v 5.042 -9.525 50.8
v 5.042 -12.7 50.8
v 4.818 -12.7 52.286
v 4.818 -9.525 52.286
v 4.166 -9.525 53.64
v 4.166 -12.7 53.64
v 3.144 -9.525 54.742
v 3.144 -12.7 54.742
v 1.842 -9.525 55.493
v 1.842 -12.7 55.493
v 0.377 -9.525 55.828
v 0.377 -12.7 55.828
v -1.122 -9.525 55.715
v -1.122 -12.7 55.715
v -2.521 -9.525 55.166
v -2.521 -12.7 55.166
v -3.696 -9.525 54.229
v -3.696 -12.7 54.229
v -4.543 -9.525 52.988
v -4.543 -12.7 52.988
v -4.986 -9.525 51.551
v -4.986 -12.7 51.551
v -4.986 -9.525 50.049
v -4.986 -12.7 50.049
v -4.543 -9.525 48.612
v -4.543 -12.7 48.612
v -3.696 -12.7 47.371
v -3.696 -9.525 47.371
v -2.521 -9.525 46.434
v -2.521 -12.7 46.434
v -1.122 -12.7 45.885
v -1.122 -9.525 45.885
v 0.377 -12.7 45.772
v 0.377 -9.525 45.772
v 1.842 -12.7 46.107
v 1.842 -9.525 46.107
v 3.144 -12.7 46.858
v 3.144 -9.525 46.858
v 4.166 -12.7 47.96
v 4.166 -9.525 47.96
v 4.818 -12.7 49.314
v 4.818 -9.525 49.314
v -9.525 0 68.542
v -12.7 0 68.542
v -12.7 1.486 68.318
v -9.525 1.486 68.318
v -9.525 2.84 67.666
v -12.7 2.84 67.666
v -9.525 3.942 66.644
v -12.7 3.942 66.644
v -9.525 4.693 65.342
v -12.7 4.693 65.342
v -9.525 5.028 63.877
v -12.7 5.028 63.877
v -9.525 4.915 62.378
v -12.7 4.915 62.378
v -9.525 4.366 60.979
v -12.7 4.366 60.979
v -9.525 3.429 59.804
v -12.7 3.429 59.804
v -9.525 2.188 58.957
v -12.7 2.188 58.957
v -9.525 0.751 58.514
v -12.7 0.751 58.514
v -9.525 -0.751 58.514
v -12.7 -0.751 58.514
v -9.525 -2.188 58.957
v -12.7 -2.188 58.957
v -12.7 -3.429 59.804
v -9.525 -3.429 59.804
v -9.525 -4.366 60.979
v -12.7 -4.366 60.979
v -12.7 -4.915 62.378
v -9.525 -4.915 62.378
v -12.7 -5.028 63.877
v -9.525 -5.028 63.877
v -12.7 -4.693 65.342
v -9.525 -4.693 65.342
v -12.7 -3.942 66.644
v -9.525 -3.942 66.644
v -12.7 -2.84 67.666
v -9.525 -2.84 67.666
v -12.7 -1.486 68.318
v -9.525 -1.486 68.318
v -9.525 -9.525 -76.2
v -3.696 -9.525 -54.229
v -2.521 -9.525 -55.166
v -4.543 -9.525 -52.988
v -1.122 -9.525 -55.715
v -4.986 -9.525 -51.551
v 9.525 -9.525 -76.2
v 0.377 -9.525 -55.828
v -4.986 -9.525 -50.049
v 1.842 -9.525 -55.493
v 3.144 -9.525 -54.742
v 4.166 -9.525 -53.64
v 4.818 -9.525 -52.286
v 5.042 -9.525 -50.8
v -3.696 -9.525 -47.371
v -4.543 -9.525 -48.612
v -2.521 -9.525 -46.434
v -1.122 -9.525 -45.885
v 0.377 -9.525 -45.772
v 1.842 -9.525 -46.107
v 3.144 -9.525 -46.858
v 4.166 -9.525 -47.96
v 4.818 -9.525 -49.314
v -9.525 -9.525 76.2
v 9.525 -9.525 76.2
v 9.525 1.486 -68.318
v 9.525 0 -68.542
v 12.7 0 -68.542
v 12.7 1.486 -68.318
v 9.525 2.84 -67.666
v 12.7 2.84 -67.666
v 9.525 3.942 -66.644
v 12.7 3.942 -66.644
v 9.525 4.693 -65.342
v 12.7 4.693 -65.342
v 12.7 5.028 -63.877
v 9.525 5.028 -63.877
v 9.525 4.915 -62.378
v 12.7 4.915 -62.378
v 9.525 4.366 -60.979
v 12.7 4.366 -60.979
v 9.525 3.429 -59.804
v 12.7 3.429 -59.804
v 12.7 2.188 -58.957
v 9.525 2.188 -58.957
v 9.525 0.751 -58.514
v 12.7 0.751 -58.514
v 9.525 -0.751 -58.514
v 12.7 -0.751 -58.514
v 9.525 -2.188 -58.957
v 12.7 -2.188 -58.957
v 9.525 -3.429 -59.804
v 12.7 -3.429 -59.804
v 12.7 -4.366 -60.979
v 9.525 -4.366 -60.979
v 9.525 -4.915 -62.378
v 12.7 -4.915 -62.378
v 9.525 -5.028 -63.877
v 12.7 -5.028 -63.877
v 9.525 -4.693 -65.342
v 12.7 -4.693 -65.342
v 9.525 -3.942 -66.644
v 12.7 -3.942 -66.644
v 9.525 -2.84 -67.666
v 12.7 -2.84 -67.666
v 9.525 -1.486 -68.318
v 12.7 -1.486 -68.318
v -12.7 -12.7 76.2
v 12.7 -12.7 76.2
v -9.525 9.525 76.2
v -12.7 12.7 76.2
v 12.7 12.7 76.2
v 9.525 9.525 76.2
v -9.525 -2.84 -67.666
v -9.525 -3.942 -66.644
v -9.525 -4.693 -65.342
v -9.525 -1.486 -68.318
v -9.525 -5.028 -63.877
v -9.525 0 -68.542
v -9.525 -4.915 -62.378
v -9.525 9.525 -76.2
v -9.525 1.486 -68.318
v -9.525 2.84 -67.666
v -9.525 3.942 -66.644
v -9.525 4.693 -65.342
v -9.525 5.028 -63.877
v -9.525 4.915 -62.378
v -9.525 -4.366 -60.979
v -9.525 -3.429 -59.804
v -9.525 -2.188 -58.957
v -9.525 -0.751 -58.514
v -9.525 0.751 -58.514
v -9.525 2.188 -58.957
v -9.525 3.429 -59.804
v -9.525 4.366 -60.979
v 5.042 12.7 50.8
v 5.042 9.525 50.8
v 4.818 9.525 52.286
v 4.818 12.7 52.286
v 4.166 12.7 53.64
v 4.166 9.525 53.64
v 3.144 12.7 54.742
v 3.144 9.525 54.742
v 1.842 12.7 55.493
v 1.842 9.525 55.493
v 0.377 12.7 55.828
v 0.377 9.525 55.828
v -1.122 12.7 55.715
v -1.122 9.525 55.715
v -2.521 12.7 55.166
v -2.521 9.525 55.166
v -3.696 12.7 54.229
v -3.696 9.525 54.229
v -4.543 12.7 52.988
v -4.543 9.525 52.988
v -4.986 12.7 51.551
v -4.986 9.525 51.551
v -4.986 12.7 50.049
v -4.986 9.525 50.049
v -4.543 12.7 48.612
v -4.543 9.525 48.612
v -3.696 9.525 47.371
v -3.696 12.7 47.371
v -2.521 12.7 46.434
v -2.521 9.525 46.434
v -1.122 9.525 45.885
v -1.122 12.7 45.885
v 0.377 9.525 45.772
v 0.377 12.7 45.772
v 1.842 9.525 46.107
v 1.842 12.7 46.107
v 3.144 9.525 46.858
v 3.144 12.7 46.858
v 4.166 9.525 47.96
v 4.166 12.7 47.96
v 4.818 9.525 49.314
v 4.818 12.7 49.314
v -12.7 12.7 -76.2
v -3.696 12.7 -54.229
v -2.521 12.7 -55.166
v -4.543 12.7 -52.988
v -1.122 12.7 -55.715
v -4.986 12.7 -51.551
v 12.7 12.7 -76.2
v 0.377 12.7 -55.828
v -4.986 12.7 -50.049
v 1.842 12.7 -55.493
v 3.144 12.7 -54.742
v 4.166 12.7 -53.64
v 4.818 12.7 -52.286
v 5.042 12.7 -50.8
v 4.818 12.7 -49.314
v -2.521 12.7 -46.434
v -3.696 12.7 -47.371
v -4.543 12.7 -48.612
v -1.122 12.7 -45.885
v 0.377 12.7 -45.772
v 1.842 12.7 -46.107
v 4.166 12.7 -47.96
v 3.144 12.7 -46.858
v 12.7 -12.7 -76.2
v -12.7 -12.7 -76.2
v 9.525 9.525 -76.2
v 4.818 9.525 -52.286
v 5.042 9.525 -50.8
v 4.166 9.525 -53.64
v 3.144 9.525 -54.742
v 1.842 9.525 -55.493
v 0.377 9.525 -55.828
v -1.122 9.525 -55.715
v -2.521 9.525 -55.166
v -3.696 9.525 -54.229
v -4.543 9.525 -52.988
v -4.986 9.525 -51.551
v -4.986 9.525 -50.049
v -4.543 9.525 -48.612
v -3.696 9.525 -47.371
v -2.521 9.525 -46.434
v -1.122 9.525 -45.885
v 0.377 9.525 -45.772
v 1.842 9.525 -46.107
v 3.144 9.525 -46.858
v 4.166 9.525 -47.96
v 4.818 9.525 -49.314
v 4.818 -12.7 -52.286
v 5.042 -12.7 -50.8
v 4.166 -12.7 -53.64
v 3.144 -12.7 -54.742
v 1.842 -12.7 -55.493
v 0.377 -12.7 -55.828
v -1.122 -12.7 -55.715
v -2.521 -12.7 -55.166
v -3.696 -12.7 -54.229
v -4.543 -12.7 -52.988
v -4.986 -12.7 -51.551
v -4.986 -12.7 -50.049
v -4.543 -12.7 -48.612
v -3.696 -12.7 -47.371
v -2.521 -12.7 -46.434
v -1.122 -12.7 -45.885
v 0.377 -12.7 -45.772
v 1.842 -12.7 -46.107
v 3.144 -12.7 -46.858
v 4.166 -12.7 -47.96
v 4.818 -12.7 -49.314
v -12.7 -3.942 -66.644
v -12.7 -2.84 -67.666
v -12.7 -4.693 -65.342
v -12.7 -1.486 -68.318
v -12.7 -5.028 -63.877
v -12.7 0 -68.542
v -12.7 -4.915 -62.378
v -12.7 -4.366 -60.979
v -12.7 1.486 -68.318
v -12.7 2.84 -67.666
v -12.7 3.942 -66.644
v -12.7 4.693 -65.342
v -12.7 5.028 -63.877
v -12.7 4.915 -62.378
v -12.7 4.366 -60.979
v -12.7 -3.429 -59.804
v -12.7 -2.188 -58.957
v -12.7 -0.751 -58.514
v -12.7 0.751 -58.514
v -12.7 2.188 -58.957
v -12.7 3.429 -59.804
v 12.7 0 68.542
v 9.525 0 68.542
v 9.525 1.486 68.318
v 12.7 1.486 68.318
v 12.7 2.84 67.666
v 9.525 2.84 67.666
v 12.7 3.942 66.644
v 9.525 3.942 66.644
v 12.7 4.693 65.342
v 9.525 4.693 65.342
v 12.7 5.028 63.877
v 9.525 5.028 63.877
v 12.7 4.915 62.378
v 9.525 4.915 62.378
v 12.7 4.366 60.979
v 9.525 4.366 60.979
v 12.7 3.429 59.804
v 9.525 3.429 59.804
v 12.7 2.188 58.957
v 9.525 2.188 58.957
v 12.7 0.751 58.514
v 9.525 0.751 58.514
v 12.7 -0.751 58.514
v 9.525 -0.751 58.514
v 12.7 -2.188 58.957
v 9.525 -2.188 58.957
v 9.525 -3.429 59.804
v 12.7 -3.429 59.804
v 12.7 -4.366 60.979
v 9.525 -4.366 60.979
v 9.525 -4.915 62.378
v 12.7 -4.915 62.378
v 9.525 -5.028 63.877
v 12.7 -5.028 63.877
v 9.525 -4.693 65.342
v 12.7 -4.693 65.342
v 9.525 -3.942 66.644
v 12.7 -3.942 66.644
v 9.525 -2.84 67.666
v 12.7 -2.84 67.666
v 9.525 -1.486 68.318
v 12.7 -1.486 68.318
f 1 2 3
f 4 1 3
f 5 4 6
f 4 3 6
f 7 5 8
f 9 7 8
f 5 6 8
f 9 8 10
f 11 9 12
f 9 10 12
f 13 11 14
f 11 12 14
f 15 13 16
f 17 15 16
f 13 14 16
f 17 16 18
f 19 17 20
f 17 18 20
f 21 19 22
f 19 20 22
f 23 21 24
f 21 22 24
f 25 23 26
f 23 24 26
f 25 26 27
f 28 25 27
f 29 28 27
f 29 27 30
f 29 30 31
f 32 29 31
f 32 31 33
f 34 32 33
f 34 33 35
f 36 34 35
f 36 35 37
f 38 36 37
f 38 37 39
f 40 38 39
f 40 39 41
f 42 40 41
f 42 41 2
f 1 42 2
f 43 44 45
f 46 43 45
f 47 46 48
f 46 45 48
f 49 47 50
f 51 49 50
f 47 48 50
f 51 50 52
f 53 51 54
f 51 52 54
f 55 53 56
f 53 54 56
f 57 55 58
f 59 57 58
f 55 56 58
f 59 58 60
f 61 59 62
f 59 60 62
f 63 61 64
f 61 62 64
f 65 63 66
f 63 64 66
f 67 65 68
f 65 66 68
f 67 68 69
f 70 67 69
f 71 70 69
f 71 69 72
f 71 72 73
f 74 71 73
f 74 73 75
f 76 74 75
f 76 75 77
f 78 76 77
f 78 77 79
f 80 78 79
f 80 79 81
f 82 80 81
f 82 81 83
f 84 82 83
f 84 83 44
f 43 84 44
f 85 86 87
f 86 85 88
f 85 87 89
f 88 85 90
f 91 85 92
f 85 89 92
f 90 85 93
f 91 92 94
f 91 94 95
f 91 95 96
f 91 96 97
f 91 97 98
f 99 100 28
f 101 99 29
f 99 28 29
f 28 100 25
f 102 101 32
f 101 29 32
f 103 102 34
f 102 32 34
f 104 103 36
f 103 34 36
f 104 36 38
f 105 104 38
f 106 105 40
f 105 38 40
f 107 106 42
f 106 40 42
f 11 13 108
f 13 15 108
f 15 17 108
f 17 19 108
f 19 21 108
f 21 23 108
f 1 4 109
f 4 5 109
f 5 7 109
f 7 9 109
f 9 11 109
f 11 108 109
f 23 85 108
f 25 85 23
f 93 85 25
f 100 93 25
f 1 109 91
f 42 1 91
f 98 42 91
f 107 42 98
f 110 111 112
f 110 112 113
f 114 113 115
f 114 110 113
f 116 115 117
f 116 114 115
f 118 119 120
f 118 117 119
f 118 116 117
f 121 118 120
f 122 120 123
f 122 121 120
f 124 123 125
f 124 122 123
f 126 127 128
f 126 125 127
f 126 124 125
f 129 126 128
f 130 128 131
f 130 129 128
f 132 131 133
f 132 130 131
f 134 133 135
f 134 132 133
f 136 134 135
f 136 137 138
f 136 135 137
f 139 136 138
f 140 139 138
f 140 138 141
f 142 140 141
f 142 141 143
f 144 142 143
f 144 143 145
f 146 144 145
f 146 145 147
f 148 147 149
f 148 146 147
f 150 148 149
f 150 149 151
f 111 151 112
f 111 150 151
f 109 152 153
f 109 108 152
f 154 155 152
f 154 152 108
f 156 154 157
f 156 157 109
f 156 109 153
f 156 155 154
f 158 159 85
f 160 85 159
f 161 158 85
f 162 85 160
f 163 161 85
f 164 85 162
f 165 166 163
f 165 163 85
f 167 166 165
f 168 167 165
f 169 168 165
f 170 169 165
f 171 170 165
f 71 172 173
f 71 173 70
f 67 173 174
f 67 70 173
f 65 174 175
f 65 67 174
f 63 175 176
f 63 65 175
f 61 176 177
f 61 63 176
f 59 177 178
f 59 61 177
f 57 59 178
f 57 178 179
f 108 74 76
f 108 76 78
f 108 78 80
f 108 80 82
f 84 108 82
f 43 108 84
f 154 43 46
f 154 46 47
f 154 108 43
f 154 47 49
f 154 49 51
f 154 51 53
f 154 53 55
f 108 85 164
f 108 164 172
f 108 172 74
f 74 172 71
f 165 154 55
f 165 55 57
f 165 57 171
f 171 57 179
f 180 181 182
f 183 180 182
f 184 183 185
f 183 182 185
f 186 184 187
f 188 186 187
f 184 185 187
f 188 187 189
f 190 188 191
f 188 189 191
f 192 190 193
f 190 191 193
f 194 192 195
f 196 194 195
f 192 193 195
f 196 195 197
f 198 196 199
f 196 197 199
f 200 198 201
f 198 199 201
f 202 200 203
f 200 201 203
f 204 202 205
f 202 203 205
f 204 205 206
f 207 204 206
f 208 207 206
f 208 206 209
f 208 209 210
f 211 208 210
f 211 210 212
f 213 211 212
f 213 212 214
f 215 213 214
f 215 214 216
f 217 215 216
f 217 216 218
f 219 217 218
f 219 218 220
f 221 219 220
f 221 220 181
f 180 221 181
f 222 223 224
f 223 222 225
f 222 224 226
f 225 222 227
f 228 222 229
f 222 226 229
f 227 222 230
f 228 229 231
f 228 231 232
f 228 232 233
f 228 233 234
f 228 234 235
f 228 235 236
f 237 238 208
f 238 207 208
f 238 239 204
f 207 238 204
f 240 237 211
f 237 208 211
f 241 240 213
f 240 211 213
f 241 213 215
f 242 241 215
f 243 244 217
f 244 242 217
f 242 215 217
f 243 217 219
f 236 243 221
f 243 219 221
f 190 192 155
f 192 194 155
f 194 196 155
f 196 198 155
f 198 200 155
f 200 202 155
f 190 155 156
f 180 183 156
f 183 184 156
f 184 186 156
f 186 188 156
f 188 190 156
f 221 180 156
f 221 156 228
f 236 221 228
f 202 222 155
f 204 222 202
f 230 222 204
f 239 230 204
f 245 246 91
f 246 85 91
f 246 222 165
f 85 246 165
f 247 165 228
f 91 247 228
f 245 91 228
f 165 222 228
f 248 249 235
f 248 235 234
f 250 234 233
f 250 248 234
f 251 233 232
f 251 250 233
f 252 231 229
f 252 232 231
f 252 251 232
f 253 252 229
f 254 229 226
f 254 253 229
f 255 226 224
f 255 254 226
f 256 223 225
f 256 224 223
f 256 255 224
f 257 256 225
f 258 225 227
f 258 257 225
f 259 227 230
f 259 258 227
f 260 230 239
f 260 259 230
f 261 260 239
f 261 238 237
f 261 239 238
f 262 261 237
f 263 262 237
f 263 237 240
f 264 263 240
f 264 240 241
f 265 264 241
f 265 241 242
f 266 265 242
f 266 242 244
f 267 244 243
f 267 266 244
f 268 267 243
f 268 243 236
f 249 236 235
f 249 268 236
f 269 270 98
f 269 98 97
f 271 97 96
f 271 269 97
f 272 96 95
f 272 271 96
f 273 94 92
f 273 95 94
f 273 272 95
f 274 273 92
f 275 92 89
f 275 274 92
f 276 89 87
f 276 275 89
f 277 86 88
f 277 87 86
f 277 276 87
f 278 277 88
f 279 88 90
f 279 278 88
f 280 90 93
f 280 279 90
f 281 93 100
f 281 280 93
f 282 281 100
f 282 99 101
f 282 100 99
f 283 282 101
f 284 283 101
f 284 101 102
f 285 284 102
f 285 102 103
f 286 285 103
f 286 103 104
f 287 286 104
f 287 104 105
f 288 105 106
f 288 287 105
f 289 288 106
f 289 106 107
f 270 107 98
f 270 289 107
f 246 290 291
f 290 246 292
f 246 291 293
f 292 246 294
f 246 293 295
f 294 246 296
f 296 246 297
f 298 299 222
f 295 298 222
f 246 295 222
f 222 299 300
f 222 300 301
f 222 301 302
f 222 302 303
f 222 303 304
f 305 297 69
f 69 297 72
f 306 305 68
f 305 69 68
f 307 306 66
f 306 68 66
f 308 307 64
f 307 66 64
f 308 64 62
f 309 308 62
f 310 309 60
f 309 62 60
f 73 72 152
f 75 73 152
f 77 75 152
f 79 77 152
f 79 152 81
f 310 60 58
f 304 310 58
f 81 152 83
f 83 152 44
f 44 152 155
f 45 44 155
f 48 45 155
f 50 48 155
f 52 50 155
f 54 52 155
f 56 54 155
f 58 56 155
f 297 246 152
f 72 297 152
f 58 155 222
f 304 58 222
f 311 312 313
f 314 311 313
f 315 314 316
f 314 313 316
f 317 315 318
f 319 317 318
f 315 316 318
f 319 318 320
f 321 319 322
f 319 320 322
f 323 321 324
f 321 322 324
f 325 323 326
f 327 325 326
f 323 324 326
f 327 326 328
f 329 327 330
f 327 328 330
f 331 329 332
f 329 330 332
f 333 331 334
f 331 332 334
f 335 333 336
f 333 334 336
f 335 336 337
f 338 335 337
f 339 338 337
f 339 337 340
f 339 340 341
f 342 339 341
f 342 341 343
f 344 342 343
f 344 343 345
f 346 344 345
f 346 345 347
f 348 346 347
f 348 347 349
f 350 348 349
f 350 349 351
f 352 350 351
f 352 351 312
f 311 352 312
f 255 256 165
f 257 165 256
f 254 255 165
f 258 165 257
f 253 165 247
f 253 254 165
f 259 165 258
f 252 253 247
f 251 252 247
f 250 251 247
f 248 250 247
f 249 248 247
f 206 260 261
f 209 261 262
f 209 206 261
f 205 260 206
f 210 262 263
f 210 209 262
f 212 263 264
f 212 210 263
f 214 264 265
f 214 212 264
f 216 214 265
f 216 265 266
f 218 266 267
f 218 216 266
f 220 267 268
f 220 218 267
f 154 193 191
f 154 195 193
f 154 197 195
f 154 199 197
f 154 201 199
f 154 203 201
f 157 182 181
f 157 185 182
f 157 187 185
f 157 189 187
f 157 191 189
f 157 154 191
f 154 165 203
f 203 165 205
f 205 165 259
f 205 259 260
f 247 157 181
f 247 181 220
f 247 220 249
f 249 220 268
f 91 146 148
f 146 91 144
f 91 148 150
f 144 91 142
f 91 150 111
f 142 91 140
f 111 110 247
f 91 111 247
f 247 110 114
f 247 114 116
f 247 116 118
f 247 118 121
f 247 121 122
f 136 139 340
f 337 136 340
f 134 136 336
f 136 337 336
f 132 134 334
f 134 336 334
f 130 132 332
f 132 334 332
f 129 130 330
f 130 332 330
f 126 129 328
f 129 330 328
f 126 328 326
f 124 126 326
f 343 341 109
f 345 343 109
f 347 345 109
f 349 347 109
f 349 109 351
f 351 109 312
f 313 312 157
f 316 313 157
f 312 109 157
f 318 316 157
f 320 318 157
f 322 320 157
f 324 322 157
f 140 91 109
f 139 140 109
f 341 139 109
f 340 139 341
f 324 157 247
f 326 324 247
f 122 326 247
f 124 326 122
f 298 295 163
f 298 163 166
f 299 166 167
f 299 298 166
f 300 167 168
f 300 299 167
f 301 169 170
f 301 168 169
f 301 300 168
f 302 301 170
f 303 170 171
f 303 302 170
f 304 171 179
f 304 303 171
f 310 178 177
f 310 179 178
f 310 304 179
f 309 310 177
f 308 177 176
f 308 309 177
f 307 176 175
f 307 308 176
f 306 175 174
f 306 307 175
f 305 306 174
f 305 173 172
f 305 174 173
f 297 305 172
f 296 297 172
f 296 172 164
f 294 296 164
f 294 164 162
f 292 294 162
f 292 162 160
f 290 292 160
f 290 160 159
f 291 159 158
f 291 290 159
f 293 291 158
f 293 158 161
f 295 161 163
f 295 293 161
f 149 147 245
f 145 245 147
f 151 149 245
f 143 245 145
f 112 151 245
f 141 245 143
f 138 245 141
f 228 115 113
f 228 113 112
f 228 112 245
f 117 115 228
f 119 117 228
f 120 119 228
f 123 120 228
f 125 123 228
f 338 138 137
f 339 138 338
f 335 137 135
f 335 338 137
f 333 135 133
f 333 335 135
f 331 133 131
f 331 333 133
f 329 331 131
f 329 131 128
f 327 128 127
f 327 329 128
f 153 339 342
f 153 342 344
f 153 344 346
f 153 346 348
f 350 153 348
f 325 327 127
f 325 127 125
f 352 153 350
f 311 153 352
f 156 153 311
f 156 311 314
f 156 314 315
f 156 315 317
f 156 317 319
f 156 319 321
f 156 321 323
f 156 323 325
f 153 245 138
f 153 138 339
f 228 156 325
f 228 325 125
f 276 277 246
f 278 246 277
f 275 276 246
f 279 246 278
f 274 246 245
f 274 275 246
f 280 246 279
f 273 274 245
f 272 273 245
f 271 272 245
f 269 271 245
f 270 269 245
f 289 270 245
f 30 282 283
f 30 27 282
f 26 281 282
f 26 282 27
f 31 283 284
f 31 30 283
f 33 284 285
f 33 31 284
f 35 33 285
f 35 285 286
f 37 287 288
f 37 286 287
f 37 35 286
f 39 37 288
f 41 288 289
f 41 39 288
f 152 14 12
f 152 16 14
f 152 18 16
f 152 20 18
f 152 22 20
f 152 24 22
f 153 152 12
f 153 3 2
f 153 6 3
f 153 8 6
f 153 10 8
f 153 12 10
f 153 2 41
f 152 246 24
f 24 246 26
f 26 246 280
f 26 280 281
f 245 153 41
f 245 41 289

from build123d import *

# Parameters (mm, degrees)
SKETCH1_W               = 25.4
SKETCH1_H               = 25.4
EXTRUDE1_DEPTH          = 76.2
SKETCH2_W               = 19.05
SKETCH2_H               = 19.05
EXTRUDE2_DEPTH          = 154.454683865
F_3_8_CLEARANCE_HOLE1_D = 10.0838
F_3_8_CLEARANCE_HOLE2_D = 10.0838


with BuildPart() as part:
    # Sketch1 → Extrude1 (new, symmetric)
    with BuildSketch(Plane.XY):
        Rectangle(SKETCH1_W, SKETCH1_H)
    extrude(amount=EXTRUDE1_DEPTH, both=True)

    # Sketch2 → Extrude2 (cut, through all)
    with BuildSketch(Plane.XY.offset(76.2)):
        Rectangle(SKETCH2_W, SKETCH2_H)
    extrude(amount=-EXTRUDE2_DEPTH, mode=Mode.SUBTRACT)

    # 3/8 Clearance Hole1 (through all)
    with Locations(Plane(origin=(12.7, 0, 0), x_dir=(0, 0, -1), z_dir=(1, 0, 0))):
        with Locations((-63.5, 0)):
            f_3_8_clearance_hole1 = Hole(F_3_8_CLEARANCE_HOLE1_D / 2)

    # 3/8 Clearance Hole2 (through all)
    with Locations(Plane(origin=(0, 12.7, 0), x_dir=(-1, 0, 0), z_dir=(0, 1, 0))):
        with Locations((0, 50.8)):
            f_3_8_clearance_hole2 = Hole(F_3_8_CLEARANCE_HOLE2_D / 2)

    # Mirror1: 3/8 Clearance Hole1, 3/8 Clearance Hole2 across plane
    add(f_3_8_clearance_hole1.mirror(Plane.XY), mode=Mode.SUBTRACT)
    add(f_3_8_clearance_hole2.mirror(Plane.XY), mode=Mode.SUBTRACT)


solid = part.part
